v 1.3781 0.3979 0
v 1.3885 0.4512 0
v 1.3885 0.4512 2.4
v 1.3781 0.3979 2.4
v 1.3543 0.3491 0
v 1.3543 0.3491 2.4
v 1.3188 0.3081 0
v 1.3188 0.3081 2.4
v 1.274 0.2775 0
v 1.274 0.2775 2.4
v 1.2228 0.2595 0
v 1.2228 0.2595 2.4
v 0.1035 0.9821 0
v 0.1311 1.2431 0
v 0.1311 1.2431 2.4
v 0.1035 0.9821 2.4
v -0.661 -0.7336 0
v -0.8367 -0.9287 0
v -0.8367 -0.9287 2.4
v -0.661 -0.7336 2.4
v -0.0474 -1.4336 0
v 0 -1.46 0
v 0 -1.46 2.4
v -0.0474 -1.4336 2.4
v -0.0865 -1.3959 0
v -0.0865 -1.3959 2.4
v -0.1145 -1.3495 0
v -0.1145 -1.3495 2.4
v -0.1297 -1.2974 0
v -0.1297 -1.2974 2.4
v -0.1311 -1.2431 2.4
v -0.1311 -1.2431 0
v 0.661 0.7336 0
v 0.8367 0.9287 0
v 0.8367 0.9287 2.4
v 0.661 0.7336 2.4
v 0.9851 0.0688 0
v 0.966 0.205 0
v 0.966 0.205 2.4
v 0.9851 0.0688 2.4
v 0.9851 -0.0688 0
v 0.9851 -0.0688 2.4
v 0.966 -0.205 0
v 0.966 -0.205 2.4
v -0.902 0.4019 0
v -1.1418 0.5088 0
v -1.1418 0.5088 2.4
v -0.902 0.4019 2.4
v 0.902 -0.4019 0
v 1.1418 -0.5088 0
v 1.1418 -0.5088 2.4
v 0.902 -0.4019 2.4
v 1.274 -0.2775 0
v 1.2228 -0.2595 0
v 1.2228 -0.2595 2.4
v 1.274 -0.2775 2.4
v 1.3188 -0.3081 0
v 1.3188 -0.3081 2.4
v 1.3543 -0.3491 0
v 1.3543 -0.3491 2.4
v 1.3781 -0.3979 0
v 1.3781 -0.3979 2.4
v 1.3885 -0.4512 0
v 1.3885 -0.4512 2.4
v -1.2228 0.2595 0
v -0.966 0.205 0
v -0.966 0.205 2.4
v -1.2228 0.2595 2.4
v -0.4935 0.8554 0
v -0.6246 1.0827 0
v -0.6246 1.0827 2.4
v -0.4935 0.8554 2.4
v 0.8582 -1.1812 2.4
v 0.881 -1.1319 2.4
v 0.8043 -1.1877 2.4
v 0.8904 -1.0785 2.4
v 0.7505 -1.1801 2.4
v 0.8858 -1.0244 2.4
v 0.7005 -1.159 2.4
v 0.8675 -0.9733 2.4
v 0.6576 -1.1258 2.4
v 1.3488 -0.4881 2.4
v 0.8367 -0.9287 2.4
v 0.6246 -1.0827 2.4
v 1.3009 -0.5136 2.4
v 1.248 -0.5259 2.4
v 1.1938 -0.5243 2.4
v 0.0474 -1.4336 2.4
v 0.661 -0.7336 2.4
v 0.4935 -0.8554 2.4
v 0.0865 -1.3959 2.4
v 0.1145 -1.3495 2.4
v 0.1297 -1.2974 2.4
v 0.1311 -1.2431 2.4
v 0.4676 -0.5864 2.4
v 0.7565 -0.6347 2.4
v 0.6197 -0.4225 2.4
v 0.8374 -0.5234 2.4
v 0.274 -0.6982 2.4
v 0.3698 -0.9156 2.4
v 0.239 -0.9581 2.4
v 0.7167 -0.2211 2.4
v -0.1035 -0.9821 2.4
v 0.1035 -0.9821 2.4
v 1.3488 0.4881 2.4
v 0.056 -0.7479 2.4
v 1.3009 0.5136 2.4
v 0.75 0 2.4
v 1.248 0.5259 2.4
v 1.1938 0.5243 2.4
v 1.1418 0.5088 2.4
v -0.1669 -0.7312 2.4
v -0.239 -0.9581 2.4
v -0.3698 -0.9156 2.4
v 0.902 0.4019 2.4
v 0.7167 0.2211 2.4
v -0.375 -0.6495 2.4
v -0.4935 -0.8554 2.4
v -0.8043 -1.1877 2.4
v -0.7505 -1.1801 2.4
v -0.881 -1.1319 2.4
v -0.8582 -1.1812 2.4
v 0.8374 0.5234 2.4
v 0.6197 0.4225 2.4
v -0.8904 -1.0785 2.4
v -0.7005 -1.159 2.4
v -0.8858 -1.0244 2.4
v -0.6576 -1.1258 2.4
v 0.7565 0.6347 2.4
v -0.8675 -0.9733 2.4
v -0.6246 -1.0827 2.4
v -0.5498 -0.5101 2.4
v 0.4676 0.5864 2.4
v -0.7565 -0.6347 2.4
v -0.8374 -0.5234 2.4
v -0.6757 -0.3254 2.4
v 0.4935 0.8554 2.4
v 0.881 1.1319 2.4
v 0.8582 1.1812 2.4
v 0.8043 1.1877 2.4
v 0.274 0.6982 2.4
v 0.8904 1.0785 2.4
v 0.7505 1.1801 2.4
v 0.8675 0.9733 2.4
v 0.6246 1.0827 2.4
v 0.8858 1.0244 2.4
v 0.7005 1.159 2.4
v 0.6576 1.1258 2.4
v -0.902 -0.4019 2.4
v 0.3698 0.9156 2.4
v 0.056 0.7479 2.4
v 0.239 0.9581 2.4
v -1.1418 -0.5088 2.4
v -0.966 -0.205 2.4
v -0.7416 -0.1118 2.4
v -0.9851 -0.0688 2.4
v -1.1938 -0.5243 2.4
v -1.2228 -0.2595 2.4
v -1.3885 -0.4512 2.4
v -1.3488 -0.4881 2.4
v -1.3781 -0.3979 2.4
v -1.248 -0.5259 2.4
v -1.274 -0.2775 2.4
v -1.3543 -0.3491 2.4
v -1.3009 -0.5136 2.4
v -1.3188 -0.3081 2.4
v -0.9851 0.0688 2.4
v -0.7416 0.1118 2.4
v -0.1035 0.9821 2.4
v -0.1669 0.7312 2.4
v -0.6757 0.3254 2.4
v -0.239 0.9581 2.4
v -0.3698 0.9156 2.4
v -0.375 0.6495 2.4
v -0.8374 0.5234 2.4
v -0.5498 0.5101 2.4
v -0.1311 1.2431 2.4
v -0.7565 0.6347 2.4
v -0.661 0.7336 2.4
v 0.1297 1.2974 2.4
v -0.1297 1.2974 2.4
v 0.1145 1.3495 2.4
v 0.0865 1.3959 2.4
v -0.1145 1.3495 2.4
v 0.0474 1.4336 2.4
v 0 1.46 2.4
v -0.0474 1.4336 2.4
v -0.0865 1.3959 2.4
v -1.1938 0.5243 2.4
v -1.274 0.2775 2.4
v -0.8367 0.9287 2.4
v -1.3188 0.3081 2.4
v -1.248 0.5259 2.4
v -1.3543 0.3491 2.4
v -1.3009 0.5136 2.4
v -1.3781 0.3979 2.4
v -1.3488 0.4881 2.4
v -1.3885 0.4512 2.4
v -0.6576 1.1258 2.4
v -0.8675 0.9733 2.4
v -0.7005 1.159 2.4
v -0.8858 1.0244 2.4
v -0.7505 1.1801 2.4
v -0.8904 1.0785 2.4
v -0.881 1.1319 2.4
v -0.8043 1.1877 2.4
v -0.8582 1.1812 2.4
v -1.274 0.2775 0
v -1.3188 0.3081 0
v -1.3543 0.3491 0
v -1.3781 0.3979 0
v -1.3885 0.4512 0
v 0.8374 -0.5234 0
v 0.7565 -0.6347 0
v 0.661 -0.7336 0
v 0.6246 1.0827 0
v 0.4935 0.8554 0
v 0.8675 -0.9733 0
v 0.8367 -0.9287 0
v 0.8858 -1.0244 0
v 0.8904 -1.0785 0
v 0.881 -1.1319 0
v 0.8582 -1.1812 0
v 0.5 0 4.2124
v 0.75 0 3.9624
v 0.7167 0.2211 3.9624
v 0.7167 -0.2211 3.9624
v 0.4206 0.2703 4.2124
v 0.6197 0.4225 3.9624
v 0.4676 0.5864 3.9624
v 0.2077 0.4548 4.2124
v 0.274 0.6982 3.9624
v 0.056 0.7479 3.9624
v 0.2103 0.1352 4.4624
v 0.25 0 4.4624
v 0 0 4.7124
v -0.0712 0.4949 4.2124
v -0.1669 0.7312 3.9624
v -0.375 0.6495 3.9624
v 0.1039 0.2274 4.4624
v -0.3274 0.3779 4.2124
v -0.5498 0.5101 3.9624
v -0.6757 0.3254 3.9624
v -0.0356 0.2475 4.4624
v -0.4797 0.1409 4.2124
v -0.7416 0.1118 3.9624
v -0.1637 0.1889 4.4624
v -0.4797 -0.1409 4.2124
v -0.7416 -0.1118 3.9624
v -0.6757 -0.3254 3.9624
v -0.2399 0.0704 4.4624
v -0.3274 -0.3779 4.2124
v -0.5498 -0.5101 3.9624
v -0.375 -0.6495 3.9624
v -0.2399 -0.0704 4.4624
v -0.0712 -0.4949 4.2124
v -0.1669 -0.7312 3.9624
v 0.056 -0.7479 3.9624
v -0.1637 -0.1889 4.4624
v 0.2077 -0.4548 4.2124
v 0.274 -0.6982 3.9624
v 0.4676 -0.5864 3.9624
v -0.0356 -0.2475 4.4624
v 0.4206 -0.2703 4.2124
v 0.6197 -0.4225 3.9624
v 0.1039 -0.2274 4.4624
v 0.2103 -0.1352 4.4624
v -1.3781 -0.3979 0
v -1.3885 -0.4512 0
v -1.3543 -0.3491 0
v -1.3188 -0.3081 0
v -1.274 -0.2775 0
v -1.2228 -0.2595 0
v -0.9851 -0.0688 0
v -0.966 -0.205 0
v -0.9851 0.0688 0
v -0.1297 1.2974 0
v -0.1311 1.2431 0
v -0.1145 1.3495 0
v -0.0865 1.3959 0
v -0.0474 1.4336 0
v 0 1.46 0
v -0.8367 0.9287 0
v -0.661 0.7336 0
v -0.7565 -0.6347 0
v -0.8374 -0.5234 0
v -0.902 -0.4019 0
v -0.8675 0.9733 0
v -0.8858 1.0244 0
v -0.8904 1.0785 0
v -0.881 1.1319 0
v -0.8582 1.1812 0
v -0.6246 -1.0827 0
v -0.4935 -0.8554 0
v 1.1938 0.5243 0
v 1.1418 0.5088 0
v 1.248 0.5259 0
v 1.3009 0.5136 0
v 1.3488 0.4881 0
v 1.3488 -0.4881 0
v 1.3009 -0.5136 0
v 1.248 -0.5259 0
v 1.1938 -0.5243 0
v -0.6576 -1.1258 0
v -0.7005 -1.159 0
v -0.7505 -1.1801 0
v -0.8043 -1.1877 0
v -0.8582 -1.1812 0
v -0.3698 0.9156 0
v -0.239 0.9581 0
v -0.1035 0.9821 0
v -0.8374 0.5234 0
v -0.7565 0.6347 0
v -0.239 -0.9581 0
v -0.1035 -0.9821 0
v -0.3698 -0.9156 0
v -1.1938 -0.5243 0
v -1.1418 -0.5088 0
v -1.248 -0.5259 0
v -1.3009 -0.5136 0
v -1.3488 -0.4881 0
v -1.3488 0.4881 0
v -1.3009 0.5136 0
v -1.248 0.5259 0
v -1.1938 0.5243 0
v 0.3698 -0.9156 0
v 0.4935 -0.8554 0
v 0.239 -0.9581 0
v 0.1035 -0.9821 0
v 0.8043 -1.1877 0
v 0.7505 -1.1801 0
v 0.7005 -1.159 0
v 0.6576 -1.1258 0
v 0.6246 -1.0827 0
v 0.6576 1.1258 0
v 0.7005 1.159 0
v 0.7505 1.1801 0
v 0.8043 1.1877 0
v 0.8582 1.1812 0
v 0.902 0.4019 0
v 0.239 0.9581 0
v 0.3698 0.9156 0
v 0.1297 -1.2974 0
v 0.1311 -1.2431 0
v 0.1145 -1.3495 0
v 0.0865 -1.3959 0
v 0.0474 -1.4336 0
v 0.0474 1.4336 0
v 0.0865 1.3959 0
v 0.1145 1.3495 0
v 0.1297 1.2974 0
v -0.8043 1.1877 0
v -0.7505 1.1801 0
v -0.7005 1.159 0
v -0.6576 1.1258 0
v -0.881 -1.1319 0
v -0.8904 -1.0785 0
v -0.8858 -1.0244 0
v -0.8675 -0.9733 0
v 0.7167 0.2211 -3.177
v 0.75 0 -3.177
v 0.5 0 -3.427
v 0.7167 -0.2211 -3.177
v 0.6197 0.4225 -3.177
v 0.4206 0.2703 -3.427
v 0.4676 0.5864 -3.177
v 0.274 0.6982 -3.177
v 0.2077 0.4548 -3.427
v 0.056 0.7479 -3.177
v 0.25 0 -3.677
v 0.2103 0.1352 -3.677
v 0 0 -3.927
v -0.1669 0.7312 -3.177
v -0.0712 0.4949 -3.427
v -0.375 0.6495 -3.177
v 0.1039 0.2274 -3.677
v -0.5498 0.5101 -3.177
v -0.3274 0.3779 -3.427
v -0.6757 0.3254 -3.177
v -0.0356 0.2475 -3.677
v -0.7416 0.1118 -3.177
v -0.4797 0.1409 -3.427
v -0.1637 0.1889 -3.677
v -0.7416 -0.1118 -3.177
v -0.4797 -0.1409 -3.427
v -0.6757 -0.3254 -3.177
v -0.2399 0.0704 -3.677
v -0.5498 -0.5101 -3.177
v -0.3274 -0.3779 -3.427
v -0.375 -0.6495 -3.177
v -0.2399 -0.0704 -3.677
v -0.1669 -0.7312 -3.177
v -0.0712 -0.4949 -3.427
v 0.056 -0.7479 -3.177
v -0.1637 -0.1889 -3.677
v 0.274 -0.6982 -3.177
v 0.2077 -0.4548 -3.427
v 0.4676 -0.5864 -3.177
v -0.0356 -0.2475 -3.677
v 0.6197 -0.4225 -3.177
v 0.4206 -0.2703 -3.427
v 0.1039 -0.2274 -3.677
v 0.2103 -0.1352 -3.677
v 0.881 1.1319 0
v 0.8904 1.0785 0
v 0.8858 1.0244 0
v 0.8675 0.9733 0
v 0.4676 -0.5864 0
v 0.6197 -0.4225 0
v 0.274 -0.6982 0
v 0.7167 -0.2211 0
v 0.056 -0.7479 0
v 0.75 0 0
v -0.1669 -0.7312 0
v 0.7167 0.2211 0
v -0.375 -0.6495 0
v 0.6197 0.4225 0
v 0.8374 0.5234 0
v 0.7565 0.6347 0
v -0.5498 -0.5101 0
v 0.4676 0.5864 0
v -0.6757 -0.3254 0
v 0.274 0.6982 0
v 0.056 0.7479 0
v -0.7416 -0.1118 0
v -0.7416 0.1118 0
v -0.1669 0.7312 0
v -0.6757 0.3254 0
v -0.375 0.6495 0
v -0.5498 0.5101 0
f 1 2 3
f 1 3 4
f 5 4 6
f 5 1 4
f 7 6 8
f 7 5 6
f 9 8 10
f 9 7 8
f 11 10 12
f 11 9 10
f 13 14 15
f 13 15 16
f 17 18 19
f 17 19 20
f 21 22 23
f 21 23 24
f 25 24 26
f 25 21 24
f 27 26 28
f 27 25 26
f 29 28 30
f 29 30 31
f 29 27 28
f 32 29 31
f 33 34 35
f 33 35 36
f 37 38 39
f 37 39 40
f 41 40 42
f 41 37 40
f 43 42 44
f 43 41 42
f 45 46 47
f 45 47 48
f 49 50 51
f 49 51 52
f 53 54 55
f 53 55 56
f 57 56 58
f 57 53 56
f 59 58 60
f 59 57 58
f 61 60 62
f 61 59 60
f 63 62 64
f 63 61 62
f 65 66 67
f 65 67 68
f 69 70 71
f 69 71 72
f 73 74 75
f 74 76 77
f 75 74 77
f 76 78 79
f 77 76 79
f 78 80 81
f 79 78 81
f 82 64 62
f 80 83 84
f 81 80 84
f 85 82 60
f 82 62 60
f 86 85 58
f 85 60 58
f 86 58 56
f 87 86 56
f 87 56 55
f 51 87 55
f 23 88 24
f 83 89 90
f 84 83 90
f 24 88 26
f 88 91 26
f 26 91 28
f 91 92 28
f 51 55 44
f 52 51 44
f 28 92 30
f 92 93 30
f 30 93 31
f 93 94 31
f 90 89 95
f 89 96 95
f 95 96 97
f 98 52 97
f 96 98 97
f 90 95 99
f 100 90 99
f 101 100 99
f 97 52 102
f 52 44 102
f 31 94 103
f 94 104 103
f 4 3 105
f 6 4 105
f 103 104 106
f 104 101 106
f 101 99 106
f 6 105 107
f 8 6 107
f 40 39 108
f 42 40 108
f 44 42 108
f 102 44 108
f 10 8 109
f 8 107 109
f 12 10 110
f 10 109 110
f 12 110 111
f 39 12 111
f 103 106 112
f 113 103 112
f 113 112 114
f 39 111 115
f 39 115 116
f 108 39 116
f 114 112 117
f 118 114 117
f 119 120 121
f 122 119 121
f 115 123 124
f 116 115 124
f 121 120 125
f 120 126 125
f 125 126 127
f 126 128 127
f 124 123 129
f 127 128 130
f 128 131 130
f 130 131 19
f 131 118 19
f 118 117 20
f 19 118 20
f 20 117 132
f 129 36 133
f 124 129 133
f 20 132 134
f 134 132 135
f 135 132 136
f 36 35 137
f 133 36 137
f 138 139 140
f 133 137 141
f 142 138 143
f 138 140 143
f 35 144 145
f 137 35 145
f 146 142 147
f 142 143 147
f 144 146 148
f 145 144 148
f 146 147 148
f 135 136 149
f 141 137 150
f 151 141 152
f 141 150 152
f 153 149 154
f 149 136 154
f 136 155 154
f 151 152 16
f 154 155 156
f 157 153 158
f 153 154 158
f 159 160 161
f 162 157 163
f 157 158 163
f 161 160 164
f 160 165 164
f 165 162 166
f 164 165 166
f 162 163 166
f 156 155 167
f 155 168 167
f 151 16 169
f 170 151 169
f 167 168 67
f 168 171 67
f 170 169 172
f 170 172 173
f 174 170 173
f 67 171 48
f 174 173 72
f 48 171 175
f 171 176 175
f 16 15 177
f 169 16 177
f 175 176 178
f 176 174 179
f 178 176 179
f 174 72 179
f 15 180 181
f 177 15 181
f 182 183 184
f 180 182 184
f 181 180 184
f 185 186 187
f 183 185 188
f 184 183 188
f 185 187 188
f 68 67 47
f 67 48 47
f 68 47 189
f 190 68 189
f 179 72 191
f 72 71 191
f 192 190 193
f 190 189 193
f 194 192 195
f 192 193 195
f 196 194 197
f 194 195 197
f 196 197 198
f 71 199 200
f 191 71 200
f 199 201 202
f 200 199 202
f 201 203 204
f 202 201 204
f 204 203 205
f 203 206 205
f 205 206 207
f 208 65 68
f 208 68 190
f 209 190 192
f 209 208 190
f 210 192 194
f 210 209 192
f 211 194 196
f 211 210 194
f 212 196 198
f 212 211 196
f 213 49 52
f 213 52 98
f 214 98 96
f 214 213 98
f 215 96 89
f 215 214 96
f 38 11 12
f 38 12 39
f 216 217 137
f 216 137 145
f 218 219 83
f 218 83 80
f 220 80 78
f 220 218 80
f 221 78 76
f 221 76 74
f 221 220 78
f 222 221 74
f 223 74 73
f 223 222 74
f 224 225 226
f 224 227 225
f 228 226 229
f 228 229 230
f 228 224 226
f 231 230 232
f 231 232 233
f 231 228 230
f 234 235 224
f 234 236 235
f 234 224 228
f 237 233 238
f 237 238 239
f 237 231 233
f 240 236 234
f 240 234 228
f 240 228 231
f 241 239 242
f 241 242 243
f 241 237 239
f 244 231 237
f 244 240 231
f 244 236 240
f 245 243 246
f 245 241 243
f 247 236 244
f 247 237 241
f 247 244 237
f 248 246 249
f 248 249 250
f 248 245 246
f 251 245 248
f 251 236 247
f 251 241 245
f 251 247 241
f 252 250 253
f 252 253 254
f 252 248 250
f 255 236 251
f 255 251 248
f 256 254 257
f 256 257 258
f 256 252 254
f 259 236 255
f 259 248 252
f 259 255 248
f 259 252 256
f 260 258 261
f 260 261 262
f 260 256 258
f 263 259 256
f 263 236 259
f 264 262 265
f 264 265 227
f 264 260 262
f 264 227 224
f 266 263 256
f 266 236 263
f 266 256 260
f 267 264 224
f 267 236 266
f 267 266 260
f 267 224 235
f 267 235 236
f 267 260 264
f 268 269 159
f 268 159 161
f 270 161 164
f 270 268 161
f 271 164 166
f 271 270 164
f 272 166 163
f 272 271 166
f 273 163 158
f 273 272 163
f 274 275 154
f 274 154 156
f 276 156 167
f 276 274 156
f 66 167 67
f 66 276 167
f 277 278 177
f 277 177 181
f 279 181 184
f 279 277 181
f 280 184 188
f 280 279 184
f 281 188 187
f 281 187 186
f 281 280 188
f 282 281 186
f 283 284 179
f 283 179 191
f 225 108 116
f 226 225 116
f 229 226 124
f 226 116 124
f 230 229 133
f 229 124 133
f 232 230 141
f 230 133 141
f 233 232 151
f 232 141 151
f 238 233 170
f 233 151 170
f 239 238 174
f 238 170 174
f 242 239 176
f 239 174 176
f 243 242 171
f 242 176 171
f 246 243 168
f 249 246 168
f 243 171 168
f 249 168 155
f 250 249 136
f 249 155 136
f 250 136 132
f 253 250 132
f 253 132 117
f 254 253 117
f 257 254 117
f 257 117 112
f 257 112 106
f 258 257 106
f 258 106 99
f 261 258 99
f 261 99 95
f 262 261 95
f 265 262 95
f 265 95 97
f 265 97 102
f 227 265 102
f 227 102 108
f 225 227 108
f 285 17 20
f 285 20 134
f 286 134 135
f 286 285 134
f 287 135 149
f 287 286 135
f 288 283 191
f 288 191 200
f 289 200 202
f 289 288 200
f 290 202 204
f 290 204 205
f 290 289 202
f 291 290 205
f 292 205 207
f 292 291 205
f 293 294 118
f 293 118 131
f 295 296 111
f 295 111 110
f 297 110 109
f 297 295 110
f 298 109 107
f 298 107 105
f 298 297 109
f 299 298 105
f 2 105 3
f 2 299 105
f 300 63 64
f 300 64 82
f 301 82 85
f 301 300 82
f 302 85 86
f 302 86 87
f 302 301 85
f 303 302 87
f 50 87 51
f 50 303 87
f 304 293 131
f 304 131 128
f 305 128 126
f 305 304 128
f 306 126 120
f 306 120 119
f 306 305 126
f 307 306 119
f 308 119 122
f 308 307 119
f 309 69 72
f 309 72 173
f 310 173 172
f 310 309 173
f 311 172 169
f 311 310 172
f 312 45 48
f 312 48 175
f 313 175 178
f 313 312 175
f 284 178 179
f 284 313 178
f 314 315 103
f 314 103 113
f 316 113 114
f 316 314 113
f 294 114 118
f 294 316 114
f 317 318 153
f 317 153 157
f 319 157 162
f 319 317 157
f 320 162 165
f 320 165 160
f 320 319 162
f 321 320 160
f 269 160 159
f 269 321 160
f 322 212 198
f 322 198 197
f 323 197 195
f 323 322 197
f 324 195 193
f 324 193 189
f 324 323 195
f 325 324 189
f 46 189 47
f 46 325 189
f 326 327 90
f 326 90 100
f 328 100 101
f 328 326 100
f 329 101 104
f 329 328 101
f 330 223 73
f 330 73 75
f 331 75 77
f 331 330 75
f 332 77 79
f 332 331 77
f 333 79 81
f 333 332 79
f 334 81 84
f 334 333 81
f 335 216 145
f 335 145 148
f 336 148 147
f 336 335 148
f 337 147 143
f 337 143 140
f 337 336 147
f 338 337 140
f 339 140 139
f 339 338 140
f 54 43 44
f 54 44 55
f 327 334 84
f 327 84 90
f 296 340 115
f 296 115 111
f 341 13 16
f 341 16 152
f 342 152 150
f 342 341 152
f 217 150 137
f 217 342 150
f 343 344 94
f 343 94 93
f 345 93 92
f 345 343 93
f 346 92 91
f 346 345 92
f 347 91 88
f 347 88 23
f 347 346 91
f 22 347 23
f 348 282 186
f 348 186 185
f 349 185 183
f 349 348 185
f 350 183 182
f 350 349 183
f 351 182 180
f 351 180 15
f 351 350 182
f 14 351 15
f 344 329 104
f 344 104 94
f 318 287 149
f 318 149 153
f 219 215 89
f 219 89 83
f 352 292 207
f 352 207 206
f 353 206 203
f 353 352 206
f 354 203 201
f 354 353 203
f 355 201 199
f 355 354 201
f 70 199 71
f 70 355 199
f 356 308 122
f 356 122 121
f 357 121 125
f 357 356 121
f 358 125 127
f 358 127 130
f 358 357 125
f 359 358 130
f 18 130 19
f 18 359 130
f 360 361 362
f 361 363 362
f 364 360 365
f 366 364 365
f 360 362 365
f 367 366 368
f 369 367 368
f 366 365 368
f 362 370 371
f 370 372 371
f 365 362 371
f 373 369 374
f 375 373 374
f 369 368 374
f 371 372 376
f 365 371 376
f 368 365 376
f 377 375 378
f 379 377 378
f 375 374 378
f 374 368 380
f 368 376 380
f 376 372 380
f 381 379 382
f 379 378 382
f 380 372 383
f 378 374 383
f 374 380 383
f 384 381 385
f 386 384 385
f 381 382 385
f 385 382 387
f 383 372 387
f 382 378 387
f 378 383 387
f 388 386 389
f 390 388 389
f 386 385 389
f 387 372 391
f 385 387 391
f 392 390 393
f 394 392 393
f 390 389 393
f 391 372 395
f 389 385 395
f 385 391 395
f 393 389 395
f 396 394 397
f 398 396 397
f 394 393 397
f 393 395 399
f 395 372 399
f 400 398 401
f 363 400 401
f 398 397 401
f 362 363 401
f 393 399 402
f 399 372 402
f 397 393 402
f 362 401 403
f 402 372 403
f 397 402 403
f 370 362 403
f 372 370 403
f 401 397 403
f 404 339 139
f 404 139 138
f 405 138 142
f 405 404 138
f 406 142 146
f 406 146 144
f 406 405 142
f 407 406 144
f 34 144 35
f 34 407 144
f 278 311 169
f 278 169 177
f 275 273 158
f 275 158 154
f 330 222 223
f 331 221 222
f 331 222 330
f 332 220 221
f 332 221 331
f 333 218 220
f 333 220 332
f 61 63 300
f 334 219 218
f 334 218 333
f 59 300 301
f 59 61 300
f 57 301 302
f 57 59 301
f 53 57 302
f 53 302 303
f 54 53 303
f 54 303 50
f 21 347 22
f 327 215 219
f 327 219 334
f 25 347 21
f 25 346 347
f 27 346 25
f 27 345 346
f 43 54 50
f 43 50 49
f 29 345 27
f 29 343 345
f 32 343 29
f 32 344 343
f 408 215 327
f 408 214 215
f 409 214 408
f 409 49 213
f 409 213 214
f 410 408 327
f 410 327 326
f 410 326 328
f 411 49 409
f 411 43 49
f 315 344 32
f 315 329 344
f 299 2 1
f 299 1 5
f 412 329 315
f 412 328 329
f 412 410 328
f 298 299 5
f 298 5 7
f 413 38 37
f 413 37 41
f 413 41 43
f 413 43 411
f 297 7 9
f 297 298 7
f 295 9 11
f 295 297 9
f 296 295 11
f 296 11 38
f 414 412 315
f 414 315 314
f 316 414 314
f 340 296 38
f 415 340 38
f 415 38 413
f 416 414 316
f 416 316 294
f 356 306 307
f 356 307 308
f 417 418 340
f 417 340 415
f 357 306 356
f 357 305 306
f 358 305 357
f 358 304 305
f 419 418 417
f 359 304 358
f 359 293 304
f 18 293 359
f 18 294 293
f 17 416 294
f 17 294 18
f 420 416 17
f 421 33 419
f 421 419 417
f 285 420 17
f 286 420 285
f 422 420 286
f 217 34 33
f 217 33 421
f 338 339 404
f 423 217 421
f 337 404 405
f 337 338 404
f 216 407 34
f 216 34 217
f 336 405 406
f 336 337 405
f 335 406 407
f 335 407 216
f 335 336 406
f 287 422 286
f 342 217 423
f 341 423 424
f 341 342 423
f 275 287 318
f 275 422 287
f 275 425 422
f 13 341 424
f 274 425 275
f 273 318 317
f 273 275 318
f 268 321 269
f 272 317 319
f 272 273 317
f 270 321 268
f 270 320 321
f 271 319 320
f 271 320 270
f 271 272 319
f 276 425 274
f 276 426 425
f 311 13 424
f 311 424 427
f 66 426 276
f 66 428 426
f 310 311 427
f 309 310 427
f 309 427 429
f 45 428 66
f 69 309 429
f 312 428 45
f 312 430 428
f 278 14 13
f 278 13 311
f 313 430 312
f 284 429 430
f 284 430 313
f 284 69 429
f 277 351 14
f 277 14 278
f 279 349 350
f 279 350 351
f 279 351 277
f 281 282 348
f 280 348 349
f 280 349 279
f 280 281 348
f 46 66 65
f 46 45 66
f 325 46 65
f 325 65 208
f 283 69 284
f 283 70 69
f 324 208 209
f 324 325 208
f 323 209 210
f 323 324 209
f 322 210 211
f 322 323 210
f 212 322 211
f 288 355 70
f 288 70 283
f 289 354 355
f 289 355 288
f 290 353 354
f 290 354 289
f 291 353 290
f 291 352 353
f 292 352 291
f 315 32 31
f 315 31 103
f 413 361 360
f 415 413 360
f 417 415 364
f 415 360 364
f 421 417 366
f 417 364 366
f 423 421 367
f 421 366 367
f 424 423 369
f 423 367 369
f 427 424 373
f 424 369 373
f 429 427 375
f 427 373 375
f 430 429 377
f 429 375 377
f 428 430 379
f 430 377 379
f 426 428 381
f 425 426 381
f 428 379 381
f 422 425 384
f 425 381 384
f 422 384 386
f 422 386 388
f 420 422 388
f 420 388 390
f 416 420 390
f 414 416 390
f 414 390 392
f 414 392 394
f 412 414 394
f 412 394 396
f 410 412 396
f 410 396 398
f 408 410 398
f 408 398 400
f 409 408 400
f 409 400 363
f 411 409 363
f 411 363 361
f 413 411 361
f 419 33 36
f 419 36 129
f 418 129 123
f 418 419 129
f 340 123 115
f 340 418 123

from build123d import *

# Parameters (mm, degrees)
SKETCH1_R                = 0.75
BOSS_EXTRUDE1_DEPTH      = 2.4
BOSS_EXTRUDE2_DEPTH      = 4.7124
BOSS_EXTRUDE2_DEPTH_BACK = 3.927
SKETCH1_2_R              = 0.75
CHAMFER1_SIZE            = 0.75


with BuildPart() as part:
    # Sketch1 → Boss-Extrude1 (new body)
    with BuildSketch(Plane.XY):
        with BuildLine():
            Line((-0.103544507, 0.982056406), (-0.131068996, 1.243109375))
            ThreePointArc((-0.131068996, 1.243109375), (-0.10199222, 1.373586424), (0, 1.46))
            ThreePointArc((0, 1.46), (0.10199222, 1.373586424), (0.131068996, 1.243109375))
            Line((0.131068996, 1.243109375), (0.103544507, 0.982056406))
            ThreePointArc((0.103544507, 0.982056406), (0.305154282, 0.93916831), (0.493469007, 0.855362256))
            Line((0.493469007, 0.855362256), (0.624644312, 1.082737033))
            ThreePointArc((0.624644312, 1.082737033), (0.724860403, 1.171204283), (0.858166468, 1.181164812))
            ThreePointArc((0.858166468, 1.181164812), (0.889887282, 1.051305237), (0.836718403, 0.928656187))
            Line((0.836718403, 0.928656187), (0.661007538, 0.733638388))
            ThreePointArc((0.661007538, 0.733638388), (0.798904282, 0.580437937), (0.901994132, 0.401948797))
            Line((0.901994132, 0.401948797), (1.141764724, 0.508795946))
            ThreePointArc((1.141764724, 0.508795946), (1.27484099, 0.521461914), (1.388542514, 0.451164812))
            ThreePointArc((1.388542514, 0.451164812), (1.337875649, 0.327461182), (1.222769819, 0.2594879))
            Line((1.222769819, 0.2594879), (0.965988157, 0.204995441))
            ThreePointArc((0.965988157, 0.204995441), (0.9875, 0), (0.965988157, -0.204995441))
            Line((0.965988157, -0.204995441), (1.222769819, -0.2594879))
            ThreePointArc((1.222769819, -0.2594879), (1.337875649, -0.327461182), (1.388542514, -0.451164812))
            ThreePointArc((1.388542514, -0.451164812), (1.27484099, -0.521461914), (1.141764724, -0.508795946))
            Line((1.141764724, -0.508795946), (0.901994132, -0.401948797))
            ThreePointArc((0.901994132, -0.401948797), (0.798904282, -0.580437937), (0.661007538, -0.733638388))
            Line((0.661007538, -0.733638388), (0.836718403, -0.928656187))
            ThreePointArc((0.836718403, -0.928656187), (0.889887282, -1.051305237), (0.858166468, -1.181164812))
            ThreePointArc((0.858166468, -1.181164812), (0.724860403, -1.171204283), (0.624644312, -1.082737033))
            Line((0.624644312, -1.082737033), (0.493469007, -0.855362256))
            ThreePointArc((0.493469007, -0.855362256), (0.305154282, -0.93916831), (0.103544507, -0.982056406))
            Line((0.103544507, -0.982056406), (0.131068996, -1.243109375))
            ThreePointArc((0.131068996, -1.243109375), (0.10199222, -1.373586424), (0, -1.46))
            ThreePointArc((0, -1.46), (-0.10199222, -1.373586424), (-0.131068996, -1.243109375))
            Line((-0.131068996, -1.243109375), (-0.103544507, -0.982056406))
            ThreePointArc((-0.103544507, -0.982056406), (-0.305154282, -0.93916831), (-0.493469007, -0.855362256))
            Line((-0.493469007, -0.855362256), (-0.624644312, -1.082737033))
            ThreePointArc((-0.624644312, -1.082737033), (-0.724860403, -1.171204283), (-0.858166468, -1.181164812))
            ThreePointArc((-0.858166468, -1.181164812), (-0.889887282, -1.051305237), (-0.836718403, -0.928656187))
            Line((-0.836718403, -0.928656187), (-0.661007538, -0.733638388))
            ThreePointArc((-0.661007538, -0.733638388), (-0.798904282, -0.580437937), (-0.901994132, -0.401948797))
            Line((-0.901994132, -0.401948797), (-1.141764724, -0.508795946))
            ThreePointArc((-1.141764724, -0.508795946), (-1.27484099, -0.521461914), (-1.388542514, -0.451164812))
            ThreePointArc((-1.388542514, -0.451164812), (-1.337875649, -0.327461182), (-1.222769819, -0.2594879))
            Line((-1.222769819, -0.2594879), (-0.965988157, -0.204995441))
            ThreePointArc((-0.965988157, -0.204995441), (-0.9875, 0), (-0.965988157, 0.204995441))
            Line((-0.965988157, 0.204995441), (-1.222769819, 0.2594879))
            ThreePointArc((-1.222769819, 0.2594879), (-1.337875649, 0.327461182), (-1.388542514, 0.451164812))
            ThreePointArc((-1.388542514, 0.451164812), (-1.27484099, 0.521461914), (-1.141764724, 0.508795946))
            Line((-1.141764724, 0.508795946), (-0.901994132, 0.401948797))
            ThreePointArc((-0.901994132, 0.401948797), (-0.798904282, 0.580437937), (-0.661007538, 0.733638388))
            Line((-0.661007538, 0.733638388), (-0.836718403, 0.928656187))
            ThreePointArc((-0.836718403, 0.928656187), (-0.889887282, 1.051305237), (-0.858166468, 1.181164812))
            ThreePointArc((-0.858166468, 1.181164812), (-0.724860403, 1.171204283), (-0.624644312, 1.082737033))
            Line((-0.624644312, 1.082737033), (-0.493469007, 0.855362256))
            ThreePointArc((-0.493469007, 0.855362256), (-0.305154282, 0.93916831), (-0.103544507, 0.982056406))
        make_face()
        Circle(SKETCH1_R, mode=Mode.SUBTRACT)
    extrude(amount=BOSS_EXTRUDE1_DEPTH)

    # Sketch1<2> → Boss-Extrude2 (add, two sides: drawn at the far end of the back side and taken through both)
    with BuildSketch(Plane.XY.offset(-BOSS_EXTRUDE2_DEPTH_BACK)):
        Circle(SKETCH1_2_R)
    extrude(amount=BOSS_EXTRUDE2_DEPTH + BOSS_EXTRUDE2_DEPTH_BACK)

    # Chamfer1
    chamfer1_edges = [part.edges().sort_by_distance(p)[0] for p in [
        (-0.75, 0, -3.927),
        (-0.75, 0, 4.7124),
    ]]
    chamfer(chamfer1_edges, length=CHAMFER1_SIZE)


solid = part.part
